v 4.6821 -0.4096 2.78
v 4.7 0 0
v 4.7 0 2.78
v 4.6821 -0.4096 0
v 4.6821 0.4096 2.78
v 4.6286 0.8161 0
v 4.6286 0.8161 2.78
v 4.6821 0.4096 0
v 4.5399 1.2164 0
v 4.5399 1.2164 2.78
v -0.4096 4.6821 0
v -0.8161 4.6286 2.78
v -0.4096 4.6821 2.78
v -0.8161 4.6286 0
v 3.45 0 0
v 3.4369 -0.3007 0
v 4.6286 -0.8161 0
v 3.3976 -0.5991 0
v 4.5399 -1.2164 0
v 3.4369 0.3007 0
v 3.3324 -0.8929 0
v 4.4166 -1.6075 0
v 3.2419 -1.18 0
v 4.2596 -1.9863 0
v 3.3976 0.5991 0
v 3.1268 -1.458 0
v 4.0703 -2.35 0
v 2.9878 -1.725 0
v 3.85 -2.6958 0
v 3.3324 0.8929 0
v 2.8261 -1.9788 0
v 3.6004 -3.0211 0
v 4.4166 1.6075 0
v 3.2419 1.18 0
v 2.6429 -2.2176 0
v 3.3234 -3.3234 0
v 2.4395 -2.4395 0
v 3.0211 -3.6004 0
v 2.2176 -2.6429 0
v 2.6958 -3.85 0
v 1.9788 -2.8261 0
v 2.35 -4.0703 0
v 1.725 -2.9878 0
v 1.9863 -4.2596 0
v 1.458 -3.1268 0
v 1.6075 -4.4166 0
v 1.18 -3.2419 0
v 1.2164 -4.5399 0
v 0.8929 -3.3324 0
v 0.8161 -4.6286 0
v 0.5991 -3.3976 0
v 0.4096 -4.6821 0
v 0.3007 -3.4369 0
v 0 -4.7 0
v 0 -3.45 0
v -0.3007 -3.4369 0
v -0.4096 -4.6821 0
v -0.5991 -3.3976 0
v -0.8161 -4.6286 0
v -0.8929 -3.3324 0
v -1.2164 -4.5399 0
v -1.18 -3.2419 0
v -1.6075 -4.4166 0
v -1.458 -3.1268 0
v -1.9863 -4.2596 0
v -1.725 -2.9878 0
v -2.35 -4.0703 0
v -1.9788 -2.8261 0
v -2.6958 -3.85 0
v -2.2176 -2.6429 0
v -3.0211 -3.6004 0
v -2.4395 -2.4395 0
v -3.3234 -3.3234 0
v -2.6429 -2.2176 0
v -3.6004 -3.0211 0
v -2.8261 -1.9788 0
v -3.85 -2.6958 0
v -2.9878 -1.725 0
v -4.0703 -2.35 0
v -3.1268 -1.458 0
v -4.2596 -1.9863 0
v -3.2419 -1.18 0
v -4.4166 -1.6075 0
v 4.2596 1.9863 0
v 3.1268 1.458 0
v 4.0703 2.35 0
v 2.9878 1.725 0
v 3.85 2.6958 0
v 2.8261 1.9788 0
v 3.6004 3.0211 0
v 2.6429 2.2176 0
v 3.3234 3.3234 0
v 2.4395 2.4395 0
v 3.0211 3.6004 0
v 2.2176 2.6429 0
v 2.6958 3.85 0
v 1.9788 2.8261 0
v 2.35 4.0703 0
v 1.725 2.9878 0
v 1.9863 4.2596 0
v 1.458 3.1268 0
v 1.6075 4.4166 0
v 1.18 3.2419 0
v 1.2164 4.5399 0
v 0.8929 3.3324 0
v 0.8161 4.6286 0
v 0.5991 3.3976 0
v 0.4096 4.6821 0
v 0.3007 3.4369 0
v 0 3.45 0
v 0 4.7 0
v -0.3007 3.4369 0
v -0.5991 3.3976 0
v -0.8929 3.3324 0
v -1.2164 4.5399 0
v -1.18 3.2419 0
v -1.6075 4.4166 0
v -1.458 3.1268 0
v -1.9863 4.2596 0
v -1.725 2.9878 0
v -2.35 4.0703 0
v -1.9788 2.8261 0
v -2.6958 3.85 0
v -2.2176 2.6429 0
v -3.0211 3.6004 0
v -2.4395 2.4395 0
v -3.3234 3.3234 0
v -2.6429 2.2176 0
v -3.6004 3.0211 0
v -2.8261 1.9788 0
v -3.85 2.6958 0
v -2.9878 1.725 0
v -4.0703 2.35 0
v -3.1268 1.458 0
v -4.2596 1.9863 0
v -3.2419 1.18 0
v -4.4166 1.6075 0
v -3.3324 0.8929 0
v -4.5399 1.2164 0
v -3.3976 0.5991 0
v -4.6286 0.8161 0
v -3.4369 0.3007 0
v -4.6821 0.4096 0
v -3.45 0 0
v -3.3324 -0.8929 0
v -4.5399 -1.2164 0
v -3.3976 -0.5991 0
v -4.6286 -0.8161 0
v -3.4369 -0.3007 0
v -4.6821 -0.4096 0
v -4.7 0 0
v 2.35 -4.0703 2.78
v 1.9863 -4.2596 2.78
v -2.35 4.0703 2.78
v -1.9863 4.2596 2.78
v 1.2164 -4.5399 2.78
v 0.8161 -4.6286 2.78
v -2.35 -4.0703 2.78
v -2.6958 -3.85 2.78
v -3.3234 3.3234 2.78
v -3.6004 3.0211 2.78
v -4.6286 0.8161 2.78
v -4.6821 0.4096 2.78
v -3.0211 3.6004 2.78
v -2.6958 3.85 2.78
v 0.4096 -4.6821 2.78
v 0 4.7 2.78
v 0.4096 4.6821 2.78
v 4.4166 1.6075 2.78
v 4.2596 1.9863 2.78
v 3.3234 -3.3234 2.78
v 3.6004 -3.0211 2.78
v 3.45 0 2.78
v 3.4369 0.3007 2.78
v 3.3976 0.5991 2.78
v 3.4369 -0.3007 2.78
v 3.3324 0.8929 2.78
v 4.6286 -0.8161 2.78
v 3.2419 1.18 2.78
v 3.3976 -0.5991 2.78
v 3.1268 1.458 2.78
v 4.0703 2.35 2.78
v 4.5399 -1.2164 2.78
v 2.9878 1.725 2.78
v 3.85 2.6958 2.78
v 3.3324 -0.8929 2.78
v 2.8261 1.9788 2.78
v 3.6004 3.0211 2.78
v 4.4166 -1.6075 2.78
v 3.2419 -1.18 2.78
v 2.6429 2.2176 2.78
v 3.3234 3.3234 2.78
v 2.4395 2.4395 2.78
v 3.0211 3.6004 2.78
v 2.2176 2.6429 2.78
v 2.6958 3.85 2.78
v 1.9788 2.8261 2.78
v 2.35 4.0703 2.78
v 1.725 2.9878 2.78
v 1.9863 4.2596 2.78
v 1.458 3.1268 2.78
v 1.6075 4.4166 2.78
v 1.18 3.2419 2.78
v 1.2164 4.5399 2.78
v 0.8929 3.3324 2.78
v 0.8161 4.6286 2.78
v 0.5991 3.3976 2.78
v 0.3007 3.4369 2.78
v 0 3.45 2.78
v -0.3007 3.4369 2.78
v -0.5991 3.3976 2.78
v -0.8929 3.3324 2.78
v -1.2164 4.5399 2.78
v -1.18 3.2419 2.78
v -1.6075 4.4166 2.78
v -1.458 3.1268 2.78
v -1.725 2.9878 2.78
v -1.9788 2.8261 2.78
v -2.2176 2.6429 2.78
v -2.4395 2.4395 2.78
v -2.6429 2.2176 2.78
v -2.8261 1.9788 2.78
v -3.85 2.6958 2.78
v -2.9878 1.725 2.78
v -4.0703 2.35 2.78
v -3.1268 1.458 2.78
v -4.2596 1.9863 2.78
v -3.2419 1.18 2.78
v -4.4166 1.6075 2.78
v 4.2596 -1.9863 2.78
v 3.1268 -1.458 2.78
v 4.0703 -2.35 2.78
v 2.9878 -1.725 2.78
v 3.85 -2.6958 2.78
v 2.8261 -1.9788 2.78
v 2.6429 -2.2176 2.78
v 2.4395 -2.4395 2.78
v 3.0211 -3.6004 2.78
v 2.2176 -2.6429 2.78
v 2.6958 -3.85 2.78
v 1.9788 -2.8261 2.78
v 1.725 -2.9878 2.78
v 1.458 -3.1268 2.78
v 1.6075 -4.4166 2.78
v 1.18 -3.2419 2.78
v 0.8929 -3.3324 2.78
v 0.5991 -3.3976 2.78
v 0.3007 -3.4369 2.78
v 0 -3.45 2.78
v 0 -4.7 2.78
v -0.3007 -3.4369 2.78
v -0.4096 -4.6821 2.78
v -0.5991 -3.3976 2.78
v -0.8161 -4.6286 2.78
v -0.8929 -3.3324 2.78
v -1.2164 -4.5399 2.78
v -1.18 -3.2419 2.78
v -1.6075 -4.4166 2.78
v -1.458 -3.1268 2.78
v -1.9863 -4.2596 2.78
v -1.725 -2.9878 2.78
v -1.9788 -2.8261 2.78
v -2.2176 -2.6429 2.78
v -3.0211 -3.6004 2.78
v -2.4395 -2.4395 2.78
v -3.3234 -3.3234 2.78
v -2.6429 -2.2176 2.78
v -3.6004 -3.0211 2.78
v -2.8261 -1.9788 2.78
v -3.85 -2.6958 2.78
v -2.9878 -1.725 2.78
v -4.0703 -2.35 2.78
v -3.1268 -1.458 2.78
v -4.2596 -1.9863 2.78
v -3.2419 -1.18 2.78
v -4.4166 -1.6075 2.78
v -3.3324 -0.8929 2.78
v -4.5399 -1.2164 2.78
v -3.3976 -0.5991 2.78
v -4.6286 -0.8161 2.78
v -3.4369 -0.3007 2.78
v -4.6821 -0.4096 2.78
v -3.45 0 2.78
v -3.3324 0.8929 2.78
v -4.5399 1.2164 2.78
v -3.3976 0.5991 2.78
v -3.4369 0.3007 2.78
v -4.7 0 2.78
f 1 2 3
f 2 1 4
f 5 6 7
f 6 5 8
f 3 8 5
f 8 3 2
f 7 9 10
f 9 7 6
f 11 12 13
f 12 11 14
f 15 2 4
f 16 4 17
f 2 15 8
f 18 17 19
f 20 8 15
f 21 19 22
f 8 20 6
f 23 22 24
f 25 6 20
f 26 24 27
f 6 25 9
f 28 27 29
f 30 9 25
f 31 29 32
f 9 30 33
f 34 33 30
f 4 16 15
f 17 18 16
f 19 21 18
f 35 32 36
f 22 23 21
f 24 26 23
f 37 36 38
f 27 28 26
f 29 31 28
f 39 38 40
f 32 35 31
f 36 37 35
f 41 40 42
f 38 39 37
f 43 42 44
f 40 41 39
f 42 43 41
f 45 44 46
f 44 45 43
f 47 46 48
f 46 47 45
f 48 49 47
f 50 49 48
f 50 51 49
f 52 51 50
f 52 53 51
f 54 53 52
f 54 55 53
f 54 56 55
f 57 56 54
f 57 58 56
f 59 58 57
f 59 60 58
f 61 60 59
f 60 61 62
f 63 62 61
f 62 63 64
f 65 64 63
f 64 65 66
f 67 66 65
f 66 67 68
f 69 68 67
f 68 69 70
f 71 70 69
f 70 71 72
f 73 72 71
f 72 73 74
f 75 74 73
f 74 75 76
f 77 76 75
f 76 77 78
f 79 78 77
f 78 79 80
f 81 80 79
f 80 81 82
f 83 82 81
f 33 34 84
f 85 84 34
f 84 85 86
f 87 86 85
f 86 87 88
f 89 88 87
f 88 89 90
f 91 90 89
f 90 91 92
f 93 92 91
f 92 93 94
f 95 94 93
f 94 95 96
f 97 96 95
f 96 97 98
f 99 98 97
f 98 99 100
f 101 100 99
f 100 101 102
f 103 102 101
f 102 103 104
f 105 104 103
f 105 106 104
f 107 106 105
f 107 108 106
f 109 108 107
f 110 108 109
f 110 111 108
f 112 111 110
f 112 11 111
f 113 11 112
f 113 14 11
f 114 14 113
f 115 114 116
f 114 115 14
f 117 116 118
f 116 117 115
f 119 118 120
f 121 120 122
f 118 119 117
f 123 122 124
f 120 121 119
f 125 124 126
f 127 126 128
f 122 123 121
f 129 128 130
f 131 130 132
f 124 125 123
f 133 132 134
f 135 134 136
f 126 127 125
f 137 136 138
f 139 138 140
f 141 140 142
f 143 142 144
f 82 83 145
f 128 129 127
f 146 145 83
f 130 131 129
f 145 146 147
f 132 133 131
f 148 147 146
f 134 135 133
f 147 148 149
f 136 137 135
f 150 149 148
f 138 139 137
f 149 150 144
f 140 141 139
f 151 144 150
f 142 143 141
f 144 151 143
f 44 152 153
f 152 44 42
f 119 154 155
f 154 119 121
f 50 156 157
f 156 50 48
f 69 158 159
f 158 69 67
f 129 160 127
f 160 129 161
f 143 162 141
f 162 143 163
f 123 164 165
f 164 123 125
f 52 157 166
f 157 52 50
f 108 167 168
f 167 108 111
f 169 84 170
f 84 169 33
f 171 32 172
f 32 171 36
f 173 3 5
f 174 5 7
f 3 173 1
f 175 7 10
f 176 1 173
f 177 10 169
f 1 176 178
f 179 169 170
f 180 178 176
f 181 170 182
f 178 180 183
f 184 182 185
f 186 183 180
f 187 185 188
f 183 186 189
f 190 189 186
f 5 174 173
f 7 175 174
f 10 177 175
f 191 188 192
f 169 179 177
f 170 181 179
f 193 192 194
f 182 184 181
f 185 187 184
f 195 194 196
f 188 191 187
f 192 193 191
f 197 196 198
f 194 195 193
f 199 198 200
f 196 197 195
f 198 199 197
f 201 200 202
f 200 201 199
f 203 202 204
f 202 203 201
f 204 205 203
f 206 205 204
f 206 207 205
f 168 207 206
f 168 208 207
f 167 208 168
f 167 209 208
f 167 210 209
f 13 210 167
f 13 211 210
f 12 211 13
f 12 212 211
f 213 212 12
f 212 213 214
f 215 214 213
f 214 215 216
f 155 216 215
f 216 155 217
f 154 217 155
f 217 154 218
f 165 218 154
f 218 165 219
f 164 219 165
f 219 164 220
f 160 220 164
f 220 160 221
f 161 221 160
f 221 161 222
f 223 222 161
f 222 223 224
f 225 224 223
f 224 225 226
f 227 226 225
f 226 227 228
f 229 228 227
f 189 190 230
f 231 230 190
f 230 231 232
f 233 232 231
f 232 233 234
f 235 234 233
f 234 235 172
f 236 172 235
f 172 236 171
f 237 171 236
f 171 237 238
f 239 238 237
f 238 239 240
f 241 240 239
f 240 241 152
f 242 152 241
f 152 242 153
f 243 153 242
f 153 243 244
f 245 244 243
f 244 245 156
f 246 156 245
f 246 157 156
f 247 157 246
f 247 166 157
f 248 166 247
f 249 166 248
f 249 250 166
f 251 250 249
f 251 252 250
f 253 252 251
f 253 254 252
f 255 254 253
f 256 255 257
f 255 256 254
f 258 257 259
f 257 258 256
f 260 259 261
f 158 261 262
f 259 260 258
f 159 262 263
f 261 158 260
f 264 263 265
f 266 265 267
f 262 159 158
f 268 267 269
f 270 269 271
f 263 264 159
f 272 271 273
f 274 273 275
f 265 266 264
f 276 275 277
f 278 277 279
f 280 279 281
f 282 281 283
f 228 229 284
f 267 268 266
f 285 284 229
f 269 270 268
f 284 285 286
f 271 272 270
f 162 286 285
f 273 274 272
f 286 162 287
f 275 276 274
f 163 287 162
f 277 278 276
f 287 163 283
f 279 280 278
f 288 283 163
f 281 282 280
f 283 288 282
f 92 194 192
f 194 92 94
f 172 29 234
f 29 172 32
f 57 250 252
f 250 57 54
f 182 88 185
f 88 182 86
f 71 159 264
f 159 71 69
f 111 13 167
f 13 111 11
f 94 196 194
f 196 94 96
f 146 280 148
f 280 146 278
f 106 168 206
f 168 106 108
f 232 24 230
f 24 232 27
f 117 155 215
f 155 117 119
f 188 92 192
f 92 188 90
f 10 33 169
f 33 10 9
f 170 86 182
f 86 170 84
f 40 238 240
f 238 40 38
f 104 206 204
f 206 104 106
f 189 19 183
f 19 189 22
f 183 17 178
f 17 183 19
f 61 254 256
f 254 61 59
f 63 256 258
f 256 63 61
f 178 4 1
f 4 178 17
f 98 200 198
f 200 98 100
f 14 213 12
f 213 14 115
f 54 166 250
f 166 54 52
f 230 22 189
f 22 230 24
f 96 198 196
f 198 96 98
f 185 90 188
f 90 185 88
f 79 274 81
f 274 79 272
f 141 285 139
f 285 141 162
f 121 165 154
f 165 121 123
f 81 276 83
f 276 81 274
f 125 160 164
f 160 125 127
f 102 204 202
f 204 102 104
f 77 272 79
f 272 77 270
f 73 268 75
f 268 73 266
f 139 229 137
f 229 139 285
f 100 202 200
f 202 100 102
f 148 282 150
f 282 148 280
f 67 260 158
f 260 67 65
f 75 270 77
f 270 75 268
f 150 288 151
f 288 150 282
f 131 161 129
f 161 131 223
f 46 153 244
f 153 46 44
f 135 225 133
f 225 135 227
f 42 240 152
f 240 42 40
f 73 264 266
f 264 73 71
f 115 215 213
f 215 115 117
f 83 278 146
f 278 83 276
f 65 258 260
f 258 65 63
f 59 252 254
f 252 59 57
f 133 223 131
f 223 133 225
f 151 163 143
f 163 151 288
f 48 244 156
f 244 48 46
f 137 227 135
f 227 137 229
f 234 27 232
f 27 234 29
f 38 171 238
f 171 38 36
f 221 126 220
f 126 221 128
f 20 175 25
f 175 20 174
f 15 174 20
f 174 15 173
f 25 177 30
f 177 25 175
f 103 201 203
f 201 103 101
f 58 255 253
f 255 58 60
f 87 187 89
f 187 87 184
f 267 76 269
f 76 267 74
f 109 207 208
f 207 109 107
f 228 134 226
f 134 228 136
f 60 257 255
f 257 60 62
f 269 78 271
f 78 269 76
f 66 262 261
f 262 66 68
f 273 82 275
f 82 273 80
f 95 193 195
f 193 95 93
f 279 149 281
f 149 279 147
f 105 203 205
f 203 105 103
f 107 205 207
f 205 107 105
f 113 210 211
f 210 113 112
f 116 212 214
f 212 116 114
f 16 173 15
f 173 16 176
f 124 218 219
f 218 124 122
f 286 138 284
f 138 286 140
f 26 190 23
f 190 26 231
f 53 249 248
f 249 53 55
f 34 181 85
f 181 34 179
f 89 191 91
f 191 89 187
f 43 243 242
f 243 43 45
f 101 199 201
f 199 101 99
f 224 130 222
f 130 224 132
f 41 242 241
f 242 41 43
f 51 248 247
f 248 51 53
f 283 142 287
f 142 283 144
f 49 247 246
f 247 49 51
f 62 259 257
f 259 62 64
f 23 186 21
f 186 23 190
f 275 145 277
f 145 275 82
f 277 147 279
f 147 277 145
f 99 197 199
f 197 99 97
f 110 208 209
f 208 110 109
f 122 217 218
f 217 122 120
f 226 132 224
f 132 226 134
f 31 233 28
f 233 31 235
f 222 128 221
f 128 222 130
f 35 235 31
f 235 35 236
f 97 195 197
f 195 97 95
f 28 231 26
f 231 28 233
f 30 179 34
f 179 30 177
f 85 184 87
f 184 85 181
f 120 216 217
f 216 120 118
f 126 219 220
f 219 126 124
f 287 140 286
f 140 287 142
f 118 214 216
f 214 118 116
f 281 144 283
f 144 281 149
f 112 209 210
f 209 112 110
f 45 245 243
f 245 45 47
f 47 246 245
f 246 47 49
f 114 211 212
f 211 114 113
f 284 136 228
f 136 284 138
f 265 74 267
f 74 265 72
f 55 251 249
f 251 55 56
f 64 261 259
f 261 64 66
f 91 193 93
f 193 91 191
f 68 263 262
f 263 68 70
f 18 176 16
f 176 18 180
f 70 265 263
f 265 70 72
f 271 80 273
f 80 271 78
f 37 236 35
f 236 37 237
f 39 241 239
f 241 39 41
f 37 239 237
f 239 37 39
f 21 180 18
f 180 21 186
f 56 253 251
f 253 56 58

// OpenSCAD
/*
 * Copyright ©2016 Laurence Gonsalves <laurence@xenomachina.com>
 *
 * This library is free software; you can redistribute it and/or
 * modify it under the terms of the GNU Lesser General Public
 * License as published by the Free Software Foundation; either
 * version 2.1 of the License, or any later version.
 *
 * This library is distributed in the hope that it will be useful,
 * but WITHOUT ANY WARRANTY; without even the implied warranty of
 * MERCHANTABILITY or FITNESS FOR A PARTICULAR PURPOSE.  See the GNU
 * Lesser General Public License for more details.
 *
 * You should have received a copy of the GNU Lesser General Public
 * License along with this library; if not, write to:
 *   Free Software Foundation, Inc.
 *   51 Franklin Street, Fifth Floor
 *   Boston, MA  02110-1301
 *   USA
 */

$fn=72;

OUTER_DIAMETER = 9.4;
WALL_THICKNESS = 1.25;
HEIGHT = 3 - .22;

module main() {
    difference (){
        cylinder(r=OUTER_DIAMETER/2, h=HEIGHT);
        cylinder(r=OUTER_DIAMETER/2 - WALL_THICKNESS, h=HEIGHT);
    }
}

main();
